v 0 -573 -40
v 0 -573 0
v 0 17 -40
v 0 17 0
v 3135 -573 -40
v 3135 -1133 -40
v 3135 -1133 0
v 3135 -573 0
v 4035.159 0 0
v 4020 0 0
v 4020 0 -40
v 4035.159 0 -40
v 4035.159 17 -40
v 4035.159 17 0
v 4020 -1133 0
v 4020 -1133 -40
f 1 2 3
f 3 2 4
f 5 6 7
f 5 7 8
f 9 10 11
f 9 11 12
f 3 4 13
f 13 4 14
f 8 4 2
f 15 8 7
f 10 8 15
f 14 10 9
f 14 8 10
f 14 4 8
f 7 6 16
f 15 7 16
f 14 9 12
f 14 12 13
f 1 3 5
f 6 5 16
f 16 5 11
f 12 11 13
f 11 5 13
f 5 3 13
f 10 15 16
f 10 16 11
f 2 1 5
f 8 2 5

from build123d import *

# Parameters (mm, degrees)
TABAN_FLAN_1_DEPTH         = 40
KES_EKSTR_ZYON1_DEPTH      = 4482.26098325
KES_EKSTR_ZYON1_DEPTH_BACK = 4482.26098325
IZIM2_W                    = 2970
IZIM2_H                    = 405
KES_EKSTR_ZYON2_DEPTH      = 4482.26098325
KES_EKSTR_ZYON2_DEPTH_BACK = 4482.26098325
IZIM4_W                    = 10
IZIM4_H                    = 2000
SEKME1_DEPTH               = 40
IZIM7_W                    = 4035.158561441
IZIM7_H                    = 17
SEKME2_DEPTH               = 40
KES_EKSTR_ZYON3_DEPTH      = 4504.787807609
KES_EKSTR_ZYON3_DEPTH_BACK = 4504.787807609
IZIM10_W                   = 3135
IZIM10_H                   = 17
KES_EKSTR_ZYON4_DEPTH      = 4504.787807609
KES_EKSTR_ZYON4_DEPTH_BACK = 4504.787807609
IZIM12_W                   = 885
IZIM12_H                   = 860
KES_EKSTR_ZYON5_DEPTH      = 4194.292813049
KES_EKSTR_ZYON5_DEPTH_BACK = 4194.292813049
IZIM14_W                   = 885
IZIM14_H                   = 7


# Sheet-metal steps are written as plain solids
with BuildPart() as part:
    # Çizim1 → Taban-Flanş1 (new body)
    with BuildSketch(Plane.XY):
        Polygon((0, 0), (0, -1385), (3250, -1385), (3250, -2000), (4010, -2000), (4010, 0), align=None)
    extrude(amount=-TABAN_FLAN_1_DEPTH)

    # Çizim2 → Kes-Ekstrüzyon1 (cut, two sides: drawn at the far end of the back side and taken through both)
    with BuildSketch(Plane.XY.offset(-KES_EKSTR_ZYON1_DEPTH_BACK)):
        with Locations((1485, -1182.5)):
            Rectangle(IZIM2_W, IZIM2_H)
    extrude(amount=KES_EKSTR_ZYON1_DEPTH + KES_EKSTR_ZYON1_DEPTH_BACK, mode=Mode.SUBTRACT)

    # Çizim3 → Kes-Ekstrüzyon2 (cut, two sides: drawn at the far end of the back side and taken through both)
    with BuildSketch(Plane.XY.offset(-KES_EKSTR_ZYON2_DEPTH_BACK)):
        Polygon((0, -980), (2970, -980), (2970, -1385), (3135, -1385), (3135, -590), (0, -590), align=None)
    extrude(amount=KES_EKSTR_ZYON2_DEPTH + KES_EKSTR_ZYON2_DEPTH_BACK, mode=Mode.SUBTRACT)

    # Çizim4 → Sekme1 (add)
    with BuildSketch(Plane.XY):
        with Locations((4015, -1000)):
            Rectangle(IZIM4_W, IZIM4_H)
    extrude(amount=-SEKME1_DEPTH)

    # Çizim7 → Sekme2 (add)
    with BuildSketch(Plane.XY):
        with Locations((2017.579280721, 8.5)):
            Rectangle(IZIM7_W, IZIM7_H)
    extrude(amount=-SEKME2_DEPTH)

    # Çizim10 → Kes-Ekstrüzyon3 (cut, two sides: drawn at the far end of the back side and taken through both)
    with BuildSketch(Plane.XY.offset(-KES_EKSTR_ZYON3_DEPTH_BACK)):
        with Locations((1567.5, -581.5)):
            Rectangle(IZIM10_W, IZIM10_H)
    extrude(amount=KES_EKSTR_ZYON3_DEPTH + KES_EKSTR_ZYON3_DEPTH_BACK, mode=Mode.SUBTRACT)

    # Çizim12 → Kes-Ekstrüzyon4 (cut, two sides: drawn at the far end of the back side and taken through both)
    with BuildSketch(Plane.XY.offset(-KES_EKSTR_ZYON4_DEPTH_BACK)):
        with Locations((3577.5, -1570)):
            Rectangle(IZIM12_W, IZIM12_H)
    extrude(amount=KES_EKSTR_ZYON4_DEPTH + KES_EKSTR_ZYON4_DEPTH_BACK, mode=Mode.SUBTRACT)

    # Çizim14 → Kes-Ekstrüzyon5 (cut, two sides: drawn at the far end of the back side and taken through both)
    with BuildSketch(Plane.XY.offset(-KES_EKSTR_ZYON5_DEPTH_BACK)):
        with Locations((3577.5, -1136.5)):
            Rectangle(IZIM14_W, IZIM14_H)
    extrude(amount=KES_EKSTR_ZYON5_DEPTH + KES_EKSTR_ZYON5_DEPTH_BACK, mode=Mode.SUBTRACT)


solid = part.part
